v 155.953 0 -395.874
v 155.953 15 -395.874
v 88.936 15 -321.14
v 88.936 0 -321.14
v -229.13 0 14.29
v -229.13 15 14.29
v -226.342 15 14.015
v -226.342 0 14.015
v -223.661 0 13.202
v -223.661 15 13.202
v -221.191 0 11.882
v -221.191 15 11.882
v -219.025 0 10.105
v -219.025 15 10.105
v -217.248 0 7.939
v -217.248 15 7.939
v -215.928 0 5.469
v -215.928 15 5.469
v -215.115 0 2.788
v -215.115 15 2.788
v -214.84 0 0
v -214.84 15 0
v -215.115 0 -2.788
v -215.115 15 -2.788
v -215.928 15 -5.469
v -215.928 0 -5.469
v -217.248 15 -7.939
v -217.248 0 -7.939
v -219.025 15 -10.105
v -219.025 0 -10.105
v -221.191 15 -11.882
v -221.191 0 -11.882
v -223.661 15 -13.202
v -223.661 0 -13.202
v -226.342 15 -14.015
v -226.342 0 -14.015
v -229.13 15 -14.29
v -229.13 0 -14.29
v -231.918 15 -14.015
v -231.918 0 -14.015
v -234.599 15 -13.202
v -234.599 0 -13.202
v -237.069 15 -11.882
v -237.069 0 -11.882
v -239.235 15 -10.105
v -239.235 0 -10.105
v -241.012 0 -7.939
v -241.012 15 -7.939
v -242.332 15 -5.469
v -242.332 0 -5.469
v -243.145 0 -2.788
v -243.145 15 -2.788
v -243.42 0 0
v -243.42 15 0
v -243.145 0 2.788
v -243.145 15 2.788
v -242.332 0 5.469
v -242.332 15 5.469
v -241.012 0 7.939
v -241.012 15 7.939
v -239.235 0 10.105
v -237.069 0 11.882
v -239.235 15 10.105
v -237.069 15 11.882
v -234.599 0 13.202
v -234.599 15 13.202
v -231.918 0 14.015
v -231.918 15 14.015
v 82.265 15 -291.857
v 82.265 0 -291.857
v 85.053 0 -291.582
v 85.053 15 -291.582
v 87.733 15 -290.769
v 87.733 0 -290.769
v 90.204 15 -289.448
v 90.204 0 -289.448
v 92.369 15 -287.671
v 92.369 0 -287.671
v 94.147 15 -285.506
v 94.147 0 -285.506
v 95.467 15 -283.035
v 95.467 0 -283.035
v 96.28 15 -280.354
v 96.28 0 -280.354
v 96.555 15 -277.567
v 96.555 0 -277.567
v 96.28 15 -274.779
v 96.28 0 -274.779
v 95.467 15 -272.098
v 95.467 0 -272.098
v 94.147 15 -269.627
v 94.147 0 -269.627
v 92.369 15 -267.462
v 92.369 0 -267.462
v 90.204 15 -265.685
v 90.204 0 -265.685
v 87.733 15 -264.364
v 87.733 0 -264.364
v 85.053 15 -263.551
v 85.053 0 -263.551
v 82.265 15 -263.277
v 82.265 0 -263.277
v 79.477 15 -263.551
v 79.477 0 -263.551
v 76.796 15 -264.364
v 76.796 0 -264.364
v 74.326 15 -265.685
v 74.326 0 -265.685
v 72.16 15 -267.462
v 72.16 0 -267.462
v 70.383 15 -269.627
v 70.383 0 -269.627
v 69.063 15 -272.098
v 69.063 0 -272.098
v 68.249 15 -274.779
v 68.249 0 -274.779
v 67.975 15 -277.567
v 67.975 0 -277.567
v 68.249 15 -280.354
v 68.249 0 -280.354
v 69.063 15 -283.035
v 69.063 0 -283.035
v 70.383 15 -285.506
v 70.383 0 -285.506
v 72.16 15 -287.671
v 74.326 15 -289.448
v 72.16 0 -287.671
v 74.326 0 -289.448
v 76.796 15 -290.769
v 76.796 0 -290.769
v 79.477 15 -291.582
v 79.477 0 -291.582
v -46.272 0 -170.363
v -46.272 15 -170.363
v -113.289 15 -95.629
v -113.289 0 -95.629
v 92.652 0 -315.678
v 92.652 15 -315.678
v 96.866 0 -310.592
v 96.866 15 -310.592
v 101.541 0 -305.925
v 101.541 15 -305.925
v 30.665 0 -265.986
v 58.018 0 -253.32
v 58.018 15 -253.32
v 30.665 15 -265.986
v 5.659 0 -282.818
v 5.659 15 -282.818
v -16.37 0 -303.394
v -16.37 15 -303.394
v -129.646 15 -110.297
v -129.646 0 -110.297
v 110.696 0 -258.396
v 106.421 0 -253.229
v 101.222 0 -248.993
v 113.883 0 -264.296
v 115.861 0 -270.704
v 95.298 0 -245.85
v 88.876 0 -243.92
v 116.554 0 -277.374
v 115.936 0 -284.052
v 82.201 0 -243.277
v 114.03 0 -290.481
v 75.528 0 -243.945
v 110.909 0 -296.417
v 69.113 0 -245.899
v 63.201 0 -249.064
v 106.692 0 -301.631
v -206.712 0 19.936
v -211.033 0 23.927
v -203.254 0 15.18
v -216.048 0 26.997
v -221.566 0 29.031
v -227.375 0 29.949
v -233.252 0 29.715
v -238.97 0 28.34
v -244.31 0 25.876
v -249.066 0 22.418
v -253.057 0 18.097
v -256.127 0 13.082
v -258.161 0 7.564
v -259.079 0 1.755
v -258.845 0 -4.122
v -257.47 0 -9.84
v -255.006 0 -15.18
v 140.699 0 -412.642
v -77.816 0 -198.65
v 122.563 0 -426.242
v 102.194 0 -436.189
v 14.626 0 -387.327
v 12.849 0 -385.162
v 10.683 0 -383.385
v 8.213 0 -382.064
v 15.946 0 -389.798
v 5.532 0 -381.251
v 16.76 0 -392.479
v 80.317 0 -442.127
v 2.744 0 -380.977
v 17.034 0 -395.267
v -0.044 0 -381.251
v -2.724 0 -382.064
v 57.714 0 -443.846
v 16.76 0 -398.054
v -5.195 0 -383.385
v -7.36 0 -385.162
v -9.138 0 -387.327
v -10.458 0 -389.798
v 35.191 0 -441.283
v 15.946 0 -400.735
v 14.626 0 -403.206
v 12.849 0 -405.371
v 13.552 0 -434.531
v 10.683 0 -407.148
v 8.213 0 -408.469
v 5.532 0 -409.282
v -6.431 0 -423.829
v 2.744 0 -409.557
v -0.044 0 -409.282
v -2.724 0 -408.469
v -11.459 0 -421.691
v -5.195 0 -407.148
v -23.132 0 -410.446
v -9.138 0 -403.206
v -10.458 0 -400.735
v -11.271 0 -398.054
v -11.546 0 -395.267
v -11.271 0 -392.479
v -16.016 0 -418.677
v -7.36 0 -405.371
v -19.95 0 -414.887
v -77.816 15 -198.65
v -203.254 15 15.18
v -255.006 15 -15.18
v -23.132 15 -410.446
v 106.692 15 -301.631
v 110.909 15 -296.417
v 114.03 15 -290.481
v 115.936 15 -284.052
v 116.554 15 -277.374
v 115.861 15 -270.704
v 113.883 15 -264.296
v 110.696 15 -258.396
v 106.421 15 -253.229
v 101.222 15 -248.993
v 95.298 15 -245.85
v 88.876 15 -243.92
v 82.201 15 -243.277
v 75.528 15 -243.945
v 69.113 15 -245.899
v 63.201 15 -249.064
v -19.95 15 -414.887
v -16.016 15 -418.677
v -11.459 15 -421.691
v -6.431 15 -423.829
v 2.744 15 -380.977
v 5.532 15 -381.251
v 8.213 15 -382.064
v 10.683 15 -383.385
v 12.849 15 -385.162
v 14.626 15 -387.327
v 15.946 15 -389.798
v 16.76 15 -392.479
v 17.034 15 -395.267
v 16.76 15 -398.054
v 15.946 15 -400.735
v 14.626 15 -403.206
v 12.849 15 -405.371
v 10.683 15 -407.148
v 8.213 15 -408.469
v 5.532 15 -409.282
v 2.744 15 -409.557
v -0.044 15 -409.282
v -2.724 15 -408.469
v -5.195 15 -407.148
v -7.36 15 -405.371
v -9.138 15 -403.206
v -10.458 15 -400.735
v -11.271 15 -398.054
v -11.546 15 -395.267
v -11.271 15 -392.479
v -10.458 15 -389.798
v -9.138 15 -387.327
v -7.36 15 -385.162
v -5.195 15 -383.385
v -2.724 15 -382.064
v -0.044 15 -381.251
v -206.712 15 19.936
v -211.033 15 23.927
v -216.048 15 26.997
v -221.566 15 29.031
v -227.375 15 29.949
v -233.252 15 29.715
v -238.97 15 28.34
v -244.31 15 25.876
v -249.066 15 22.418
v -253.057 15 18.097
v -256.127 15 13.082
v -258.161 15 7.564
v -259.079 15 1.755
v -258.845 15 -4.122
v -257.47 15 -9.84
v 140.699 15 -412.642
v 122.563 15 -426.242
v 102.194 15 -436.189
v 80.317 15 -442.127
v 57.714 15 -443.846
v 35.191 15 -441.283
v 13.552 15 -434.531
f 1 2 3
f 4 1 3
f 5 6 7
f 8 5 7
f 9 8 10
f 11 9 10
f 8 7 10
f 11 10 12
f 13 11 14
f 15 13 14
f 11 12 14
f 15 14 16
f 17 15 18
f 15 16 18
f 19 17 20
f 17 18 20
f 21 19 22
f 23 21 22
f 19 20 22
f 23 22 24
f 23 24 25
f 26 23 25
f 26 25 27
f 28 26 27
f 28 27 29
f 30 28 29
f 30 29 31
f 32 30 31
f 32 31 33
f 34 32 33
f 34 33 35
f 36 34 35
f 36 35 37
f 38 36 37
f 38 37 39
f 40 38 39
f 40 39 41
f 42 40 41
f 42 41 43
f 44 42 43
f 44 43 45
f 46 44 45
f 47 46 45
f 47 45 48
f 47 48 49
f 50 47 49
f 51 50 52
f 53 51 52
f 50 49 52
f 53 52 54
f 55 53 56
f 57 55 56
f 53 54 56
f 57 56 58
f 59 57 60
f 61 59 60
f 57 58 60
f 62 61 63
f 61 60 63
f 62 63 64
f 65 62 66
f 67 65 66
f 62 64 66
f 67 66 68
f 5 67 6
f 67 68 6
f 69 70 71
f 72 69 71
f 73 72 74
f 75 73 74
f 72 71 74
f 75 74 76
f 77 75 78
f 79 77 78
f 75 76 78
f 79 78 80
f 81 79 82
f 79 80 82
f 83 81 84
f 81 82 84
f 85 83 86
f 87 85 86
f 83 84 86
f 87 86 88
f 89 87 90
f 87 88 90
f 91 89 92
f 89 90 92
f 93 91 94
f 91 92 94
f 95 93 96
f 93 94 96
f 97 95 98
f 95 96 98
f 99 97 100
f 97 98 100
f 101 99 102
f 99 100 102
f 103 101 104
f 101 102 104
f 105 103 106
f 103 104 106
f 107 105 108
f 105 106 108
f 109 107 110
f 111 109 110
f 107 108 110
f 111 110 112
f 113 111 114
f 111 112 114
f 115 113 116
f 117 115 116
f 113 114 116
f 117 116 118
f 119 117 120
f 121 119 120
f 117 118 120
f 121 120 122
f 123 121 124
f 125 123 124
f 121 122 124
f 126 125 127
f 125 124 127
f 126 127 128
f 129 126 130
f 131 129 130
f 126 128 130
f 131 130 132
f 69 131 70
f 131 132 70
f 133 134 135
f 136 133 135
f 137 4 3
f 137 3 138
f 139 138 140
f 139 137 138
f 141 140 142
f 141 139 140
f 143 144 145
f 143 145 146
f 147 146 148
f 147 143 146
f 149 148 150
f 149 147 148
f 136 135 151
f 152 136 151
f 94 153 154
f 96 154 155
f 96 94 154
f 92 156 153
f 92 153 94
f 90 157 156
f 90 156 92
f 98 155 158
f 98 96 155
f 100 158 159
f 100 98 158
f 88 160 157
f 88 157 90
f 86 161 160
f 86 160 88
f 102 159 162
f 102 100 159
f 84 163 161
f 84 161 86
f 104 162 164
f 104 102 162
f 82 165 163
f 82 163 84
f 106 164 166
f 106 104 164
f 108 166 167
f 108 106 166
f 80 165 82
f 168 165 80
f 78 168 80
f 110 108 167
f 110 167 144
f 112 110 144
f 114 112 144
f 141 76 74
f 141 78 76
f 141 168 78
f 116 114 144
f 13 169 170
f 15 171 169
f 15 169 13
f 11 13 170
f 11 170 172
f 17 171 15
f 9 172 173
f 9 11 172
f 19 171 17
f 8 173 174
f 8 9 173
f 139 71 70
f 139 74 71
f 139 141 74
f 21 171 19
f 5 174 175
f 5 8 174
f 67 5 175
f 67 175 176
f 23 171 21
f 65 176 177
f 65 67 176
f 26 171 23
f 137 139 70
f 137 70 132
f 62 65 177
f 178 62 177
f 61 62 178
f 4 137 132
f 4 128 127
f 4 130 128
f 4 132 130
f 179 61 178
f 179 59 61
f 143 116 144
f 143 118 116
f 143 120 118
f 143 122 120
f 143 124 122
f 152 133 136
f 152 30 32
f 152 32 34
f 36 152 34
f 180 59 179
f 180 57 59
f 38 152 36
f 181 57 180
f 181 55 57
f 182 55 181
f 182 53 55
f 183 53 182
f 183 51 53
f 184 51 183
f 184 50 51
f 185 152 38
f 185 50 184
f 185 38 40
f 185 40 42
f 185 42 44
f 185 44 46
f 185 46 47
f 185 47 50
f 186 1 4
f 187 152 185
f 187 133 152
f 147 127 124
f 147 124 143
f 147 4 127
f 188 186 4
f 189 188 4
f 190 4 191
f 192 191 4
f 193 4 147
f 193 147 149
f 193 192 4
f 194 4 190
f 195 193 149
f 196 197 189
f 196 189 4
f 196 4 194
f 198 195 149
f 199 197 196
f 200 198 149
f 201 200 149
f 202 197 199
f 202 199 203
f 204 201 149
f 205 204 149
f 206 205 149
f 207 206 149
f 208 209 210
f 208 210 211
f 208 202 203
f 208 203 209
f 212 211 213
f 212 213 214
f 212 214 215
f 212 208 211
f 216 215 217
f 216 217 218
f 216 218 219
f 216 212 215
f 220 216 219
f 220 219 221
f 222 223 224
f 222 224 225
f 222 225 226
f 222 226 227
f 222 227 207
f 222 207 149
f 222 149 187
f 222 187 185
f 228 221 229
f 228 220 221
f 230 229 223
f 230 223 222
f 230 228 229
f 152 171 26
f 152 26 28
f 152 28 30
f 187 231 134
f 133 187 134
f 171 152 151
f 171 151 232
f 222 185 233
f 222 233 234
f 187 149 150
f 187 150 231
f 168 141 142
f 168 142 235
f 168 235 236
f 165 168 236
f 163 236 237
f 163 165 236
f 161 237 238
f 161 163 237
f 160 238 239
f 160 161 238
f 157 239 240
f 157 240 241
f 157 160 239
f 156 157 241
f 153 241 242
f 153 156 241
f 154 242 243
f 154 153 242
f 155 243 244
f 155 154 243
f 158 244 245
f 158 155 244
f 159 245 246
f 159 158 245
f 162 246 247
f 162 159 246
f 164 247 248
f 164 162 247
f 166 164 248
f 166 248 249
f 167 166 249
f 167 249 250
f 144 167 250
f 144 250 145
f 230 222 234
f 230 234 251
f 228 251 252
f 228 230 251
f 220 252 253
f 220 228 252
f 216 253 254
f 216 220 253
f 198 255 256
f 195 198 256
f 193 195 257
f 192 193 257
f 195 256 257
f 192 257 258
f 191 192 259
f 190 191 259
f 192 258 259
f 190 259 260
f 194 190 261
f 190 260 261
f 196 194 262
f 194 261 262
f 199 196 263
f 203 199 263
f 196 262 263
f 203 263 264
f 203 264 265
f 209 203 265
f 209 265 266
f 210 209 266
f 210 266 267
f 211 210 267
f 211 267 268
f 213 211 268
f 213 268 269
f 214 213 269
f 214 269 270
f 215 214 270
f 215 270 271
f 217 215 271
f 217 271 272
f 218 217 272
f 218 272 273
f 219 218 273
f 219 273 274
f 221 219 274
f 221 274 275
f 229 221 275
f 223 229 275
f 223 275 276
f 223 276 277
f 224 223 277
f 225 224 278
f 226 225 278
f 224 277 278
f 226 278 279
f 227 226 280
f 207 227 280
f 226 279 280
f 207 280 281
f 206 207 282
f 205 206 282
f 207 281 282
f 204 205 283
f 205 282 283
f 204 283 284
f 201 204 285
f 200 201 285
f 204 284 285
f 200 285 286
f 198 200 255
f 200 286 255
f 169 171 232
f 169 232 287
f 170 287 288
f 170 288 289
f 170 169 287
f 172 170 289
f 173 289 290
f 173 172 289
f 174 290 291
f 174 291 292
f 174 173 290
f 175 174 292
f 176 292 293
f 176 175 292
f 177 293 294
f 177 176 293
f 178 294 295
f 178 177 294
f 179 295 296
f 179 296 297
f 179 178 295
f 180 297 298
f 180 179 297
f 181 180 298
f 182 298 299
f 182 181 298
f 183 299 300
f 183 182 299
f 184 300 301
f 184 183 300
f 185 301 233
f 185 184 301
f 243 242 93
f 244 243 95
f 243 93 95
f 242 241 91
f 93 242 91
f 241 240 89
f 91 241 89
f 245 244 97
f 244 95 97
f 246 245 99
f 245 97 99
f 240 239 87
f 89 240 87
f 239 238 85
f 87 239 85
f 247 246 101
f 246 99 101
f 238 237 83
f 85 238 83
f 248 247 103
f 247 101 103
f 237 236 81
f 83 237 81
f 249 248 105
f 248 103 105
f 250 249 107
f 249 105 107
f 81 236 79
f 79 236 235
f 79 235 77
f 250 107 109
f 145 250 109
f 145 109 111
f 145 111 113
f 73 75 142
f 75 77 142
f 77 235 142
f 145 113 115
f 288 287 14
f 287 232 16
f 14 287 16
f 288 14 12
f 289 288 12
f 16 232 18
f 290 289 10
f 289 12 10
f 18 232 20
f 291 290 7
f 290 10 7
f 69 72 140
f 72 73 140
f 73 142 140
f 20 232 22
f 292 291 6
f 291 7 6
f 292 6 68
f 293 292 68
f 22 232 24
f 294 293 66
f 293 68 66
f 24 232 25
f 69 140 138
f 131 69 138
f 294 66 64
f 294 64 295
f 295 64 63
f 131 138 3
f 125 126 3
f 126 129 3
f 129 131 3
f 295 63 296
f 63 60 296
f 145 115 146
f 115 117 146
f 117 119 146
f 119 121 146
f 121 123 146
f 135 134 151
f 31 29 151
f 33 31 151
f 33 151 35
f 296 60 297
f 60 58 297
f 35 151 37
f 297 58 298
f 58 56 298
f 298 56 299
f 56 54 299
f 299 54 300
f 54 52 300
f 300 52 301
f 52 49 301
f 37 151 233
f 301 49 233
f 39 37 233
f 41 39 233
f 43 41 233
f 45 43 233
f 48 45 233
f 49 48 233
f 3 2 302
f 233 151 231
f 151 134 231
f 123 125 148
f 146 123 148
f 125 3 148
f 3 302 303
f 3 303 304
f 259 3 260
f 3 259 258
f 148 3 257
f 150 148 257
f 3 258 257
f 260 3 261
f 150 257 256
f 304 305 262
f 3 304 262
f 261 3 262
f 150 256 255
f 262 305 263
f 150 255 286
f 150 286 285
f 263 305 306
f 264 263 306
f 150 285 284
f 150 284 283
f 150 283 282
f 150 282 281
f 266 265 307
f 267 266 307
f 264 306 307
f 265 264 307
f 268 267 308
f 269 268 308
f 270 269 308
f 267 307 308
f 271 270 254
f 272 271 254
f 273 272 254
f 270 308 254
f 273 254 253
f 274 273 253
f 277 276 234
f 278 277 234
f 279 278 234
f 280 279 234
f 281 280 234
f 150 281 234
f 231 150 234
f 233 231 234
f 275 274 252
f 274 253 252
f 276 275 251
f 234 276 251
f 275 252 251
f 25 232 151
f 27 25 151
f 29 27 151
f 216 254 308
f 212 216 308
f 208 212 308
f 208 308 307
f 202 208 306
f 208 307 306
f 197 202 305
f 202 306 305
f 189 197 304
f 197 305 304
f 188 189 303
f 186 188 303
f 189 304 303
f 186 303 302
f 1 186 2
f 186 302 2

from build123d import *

# Parameters (mm, degrees)
SALIENTE_EXTRUIR1_DEPTH = 15
CROQUIS3_R              = 14.29
CORTAR_EXTRUIR2_DEPTH   = 499.221807184
SALIENTE_EXTRUIR2_DEPTH = 15
SALIENTE_EXTRUIR3_DEPTH = 15
CROQUIS6_R              = 14.29
SALIENTE_EXTRUIR4_DEPTH = 15


with BuildPart() as part:
    # Croquis1 → Saliente-Extruir1 (new body)
    with BuildSketch(Plane(origin=(0, 0, 0), x_dir=(1, 0, 0), z_dir=(0, 1, 0))):
        with BuildLine():
            Line((28.62028588, 380.086840422), (-203.253807163, -15.179678662))
            ThreePointArc((-203.253807163, -15.179678662), (-244.309678662, -25.876192837), (-255.006192837, 15.179678662))
            Line((-255.006192837, 15.179678662), (-23.132099794, 410.446197745))
            ThreePointArc((-23.132099794, 410.446197745), (17.923771705, 421.142711921), (28.62028588, 380.086840422))
        make_face()
    extrude(amount=SALIENTE_EXTRUIR1_DEPTH)

    # Croquis3 → Cortar-Extruir2 (cut, through all)
    with BuildSketch(Plane(origin=(0, 15, 0), x_dir=(1, 0, 0), z_dir=(0, 1, 0))):
        with Locations(Location((-229.13, 0, 0), (0, 0, 270))):
            Circle(CROQUIS3_R)
        with Locations(Location((2.744093043, 395.266519084, 0), (0, 0, 270))):
            Circle(CROQUIS3_R)
    extrude(amount=-CORTAR_EXTRUIR2_DEPTH, mode=Mode.SUBTRACT)

    # Croquis4 → Saliente-Extruir2 (add, through all)
    with BuildSketch(Plane(origin=(0, 15, 0), x_dir=(1, 0, 0), z_dir=(0, 1, 0))):
        Polygon((-113.288910537, 95.628521871), (-129.646022382, 110.296576517), (-77.815690841, 198.649675659), (-46.271672707, 170.362934935), align=None)
    extrude(amount=-SALIENTE_EXTRUIR2_DEPTH)

    # Croquis5 → Saliente-Extruir3 (add, through all)
    with BuildSketch(Plane(origin=(0, 15, 0), x_dir=(1, 0, 0), z_dir=(0, 1, 0))):
        with BuildLine():
            Line((155.952842447, 395.874026356), (88.935604616, 321.139613292))
            ThreePointArc((88.935604616, 321.139613292), (53.823388605, 345.447170601), (11.459302657, 350.833196717))
            Line((11.459302657, 350.833196717), (21.614505852, 387.987304257))
            Line((21.614505852, 387.987304257), (17.093708134, 410.446197745))
            Line((17.093708134, 410.446197745), (-23.132099794, 410.446197745))
            ThreePointArc((-23.132099794, 410.446197745), (-16.015624614, 418.677477916), (-6.431242037, 423.828963415))
            ThreePointArc((-6.431242037, 423.828963415), (80.317160754, 442.127171951), (155.952842447, 395.874026356))
        make_face()
    extrude(amount=-SALIENTE_EXTRUIR3_DEPTH)

    # Croquis6 → Saliente-Extruir4 (add)
    with BuildSketch(Plane(origin=(0, 0, 0), x_dir=(-1, 0, 0), z_dir=(0, -1, 0))):
        with BuildLine():
            Line((16.370108222, 303.393509849), (-7.031750258, 366.185372475))
            Line((-7.031750258, 366.185372475), (-88.935604616, 345.894949454))
            Line((-88.935604616, 345.894949454), (-88.935604616, 321.139613292))
            ThreePointArc((-88.935604616, 321.139613292), (-94.698962335, 313.085487939), (-101.541302009, 305.925347215))
            ThreePointArc((-101.541302009, 305.925347215), (-108.68476793, 255.708040538), (-58.018177093, 253.319826096))
            ThreePointArc((-58.018177093, 253.319826096), (-17.827653511, 273.905315038), (16.370108222, 303.393509849))
        make_face()
        with Locations(Location((-82.26486862, 277.566517623, 0), (0, 0, 90))):
            Circle(CROQUIS6_R, mode=Mode.SUBTRACT)
    extrude(amount=-SALIENTE_EXTRUIR4_DEPTH)


solid = part.part
